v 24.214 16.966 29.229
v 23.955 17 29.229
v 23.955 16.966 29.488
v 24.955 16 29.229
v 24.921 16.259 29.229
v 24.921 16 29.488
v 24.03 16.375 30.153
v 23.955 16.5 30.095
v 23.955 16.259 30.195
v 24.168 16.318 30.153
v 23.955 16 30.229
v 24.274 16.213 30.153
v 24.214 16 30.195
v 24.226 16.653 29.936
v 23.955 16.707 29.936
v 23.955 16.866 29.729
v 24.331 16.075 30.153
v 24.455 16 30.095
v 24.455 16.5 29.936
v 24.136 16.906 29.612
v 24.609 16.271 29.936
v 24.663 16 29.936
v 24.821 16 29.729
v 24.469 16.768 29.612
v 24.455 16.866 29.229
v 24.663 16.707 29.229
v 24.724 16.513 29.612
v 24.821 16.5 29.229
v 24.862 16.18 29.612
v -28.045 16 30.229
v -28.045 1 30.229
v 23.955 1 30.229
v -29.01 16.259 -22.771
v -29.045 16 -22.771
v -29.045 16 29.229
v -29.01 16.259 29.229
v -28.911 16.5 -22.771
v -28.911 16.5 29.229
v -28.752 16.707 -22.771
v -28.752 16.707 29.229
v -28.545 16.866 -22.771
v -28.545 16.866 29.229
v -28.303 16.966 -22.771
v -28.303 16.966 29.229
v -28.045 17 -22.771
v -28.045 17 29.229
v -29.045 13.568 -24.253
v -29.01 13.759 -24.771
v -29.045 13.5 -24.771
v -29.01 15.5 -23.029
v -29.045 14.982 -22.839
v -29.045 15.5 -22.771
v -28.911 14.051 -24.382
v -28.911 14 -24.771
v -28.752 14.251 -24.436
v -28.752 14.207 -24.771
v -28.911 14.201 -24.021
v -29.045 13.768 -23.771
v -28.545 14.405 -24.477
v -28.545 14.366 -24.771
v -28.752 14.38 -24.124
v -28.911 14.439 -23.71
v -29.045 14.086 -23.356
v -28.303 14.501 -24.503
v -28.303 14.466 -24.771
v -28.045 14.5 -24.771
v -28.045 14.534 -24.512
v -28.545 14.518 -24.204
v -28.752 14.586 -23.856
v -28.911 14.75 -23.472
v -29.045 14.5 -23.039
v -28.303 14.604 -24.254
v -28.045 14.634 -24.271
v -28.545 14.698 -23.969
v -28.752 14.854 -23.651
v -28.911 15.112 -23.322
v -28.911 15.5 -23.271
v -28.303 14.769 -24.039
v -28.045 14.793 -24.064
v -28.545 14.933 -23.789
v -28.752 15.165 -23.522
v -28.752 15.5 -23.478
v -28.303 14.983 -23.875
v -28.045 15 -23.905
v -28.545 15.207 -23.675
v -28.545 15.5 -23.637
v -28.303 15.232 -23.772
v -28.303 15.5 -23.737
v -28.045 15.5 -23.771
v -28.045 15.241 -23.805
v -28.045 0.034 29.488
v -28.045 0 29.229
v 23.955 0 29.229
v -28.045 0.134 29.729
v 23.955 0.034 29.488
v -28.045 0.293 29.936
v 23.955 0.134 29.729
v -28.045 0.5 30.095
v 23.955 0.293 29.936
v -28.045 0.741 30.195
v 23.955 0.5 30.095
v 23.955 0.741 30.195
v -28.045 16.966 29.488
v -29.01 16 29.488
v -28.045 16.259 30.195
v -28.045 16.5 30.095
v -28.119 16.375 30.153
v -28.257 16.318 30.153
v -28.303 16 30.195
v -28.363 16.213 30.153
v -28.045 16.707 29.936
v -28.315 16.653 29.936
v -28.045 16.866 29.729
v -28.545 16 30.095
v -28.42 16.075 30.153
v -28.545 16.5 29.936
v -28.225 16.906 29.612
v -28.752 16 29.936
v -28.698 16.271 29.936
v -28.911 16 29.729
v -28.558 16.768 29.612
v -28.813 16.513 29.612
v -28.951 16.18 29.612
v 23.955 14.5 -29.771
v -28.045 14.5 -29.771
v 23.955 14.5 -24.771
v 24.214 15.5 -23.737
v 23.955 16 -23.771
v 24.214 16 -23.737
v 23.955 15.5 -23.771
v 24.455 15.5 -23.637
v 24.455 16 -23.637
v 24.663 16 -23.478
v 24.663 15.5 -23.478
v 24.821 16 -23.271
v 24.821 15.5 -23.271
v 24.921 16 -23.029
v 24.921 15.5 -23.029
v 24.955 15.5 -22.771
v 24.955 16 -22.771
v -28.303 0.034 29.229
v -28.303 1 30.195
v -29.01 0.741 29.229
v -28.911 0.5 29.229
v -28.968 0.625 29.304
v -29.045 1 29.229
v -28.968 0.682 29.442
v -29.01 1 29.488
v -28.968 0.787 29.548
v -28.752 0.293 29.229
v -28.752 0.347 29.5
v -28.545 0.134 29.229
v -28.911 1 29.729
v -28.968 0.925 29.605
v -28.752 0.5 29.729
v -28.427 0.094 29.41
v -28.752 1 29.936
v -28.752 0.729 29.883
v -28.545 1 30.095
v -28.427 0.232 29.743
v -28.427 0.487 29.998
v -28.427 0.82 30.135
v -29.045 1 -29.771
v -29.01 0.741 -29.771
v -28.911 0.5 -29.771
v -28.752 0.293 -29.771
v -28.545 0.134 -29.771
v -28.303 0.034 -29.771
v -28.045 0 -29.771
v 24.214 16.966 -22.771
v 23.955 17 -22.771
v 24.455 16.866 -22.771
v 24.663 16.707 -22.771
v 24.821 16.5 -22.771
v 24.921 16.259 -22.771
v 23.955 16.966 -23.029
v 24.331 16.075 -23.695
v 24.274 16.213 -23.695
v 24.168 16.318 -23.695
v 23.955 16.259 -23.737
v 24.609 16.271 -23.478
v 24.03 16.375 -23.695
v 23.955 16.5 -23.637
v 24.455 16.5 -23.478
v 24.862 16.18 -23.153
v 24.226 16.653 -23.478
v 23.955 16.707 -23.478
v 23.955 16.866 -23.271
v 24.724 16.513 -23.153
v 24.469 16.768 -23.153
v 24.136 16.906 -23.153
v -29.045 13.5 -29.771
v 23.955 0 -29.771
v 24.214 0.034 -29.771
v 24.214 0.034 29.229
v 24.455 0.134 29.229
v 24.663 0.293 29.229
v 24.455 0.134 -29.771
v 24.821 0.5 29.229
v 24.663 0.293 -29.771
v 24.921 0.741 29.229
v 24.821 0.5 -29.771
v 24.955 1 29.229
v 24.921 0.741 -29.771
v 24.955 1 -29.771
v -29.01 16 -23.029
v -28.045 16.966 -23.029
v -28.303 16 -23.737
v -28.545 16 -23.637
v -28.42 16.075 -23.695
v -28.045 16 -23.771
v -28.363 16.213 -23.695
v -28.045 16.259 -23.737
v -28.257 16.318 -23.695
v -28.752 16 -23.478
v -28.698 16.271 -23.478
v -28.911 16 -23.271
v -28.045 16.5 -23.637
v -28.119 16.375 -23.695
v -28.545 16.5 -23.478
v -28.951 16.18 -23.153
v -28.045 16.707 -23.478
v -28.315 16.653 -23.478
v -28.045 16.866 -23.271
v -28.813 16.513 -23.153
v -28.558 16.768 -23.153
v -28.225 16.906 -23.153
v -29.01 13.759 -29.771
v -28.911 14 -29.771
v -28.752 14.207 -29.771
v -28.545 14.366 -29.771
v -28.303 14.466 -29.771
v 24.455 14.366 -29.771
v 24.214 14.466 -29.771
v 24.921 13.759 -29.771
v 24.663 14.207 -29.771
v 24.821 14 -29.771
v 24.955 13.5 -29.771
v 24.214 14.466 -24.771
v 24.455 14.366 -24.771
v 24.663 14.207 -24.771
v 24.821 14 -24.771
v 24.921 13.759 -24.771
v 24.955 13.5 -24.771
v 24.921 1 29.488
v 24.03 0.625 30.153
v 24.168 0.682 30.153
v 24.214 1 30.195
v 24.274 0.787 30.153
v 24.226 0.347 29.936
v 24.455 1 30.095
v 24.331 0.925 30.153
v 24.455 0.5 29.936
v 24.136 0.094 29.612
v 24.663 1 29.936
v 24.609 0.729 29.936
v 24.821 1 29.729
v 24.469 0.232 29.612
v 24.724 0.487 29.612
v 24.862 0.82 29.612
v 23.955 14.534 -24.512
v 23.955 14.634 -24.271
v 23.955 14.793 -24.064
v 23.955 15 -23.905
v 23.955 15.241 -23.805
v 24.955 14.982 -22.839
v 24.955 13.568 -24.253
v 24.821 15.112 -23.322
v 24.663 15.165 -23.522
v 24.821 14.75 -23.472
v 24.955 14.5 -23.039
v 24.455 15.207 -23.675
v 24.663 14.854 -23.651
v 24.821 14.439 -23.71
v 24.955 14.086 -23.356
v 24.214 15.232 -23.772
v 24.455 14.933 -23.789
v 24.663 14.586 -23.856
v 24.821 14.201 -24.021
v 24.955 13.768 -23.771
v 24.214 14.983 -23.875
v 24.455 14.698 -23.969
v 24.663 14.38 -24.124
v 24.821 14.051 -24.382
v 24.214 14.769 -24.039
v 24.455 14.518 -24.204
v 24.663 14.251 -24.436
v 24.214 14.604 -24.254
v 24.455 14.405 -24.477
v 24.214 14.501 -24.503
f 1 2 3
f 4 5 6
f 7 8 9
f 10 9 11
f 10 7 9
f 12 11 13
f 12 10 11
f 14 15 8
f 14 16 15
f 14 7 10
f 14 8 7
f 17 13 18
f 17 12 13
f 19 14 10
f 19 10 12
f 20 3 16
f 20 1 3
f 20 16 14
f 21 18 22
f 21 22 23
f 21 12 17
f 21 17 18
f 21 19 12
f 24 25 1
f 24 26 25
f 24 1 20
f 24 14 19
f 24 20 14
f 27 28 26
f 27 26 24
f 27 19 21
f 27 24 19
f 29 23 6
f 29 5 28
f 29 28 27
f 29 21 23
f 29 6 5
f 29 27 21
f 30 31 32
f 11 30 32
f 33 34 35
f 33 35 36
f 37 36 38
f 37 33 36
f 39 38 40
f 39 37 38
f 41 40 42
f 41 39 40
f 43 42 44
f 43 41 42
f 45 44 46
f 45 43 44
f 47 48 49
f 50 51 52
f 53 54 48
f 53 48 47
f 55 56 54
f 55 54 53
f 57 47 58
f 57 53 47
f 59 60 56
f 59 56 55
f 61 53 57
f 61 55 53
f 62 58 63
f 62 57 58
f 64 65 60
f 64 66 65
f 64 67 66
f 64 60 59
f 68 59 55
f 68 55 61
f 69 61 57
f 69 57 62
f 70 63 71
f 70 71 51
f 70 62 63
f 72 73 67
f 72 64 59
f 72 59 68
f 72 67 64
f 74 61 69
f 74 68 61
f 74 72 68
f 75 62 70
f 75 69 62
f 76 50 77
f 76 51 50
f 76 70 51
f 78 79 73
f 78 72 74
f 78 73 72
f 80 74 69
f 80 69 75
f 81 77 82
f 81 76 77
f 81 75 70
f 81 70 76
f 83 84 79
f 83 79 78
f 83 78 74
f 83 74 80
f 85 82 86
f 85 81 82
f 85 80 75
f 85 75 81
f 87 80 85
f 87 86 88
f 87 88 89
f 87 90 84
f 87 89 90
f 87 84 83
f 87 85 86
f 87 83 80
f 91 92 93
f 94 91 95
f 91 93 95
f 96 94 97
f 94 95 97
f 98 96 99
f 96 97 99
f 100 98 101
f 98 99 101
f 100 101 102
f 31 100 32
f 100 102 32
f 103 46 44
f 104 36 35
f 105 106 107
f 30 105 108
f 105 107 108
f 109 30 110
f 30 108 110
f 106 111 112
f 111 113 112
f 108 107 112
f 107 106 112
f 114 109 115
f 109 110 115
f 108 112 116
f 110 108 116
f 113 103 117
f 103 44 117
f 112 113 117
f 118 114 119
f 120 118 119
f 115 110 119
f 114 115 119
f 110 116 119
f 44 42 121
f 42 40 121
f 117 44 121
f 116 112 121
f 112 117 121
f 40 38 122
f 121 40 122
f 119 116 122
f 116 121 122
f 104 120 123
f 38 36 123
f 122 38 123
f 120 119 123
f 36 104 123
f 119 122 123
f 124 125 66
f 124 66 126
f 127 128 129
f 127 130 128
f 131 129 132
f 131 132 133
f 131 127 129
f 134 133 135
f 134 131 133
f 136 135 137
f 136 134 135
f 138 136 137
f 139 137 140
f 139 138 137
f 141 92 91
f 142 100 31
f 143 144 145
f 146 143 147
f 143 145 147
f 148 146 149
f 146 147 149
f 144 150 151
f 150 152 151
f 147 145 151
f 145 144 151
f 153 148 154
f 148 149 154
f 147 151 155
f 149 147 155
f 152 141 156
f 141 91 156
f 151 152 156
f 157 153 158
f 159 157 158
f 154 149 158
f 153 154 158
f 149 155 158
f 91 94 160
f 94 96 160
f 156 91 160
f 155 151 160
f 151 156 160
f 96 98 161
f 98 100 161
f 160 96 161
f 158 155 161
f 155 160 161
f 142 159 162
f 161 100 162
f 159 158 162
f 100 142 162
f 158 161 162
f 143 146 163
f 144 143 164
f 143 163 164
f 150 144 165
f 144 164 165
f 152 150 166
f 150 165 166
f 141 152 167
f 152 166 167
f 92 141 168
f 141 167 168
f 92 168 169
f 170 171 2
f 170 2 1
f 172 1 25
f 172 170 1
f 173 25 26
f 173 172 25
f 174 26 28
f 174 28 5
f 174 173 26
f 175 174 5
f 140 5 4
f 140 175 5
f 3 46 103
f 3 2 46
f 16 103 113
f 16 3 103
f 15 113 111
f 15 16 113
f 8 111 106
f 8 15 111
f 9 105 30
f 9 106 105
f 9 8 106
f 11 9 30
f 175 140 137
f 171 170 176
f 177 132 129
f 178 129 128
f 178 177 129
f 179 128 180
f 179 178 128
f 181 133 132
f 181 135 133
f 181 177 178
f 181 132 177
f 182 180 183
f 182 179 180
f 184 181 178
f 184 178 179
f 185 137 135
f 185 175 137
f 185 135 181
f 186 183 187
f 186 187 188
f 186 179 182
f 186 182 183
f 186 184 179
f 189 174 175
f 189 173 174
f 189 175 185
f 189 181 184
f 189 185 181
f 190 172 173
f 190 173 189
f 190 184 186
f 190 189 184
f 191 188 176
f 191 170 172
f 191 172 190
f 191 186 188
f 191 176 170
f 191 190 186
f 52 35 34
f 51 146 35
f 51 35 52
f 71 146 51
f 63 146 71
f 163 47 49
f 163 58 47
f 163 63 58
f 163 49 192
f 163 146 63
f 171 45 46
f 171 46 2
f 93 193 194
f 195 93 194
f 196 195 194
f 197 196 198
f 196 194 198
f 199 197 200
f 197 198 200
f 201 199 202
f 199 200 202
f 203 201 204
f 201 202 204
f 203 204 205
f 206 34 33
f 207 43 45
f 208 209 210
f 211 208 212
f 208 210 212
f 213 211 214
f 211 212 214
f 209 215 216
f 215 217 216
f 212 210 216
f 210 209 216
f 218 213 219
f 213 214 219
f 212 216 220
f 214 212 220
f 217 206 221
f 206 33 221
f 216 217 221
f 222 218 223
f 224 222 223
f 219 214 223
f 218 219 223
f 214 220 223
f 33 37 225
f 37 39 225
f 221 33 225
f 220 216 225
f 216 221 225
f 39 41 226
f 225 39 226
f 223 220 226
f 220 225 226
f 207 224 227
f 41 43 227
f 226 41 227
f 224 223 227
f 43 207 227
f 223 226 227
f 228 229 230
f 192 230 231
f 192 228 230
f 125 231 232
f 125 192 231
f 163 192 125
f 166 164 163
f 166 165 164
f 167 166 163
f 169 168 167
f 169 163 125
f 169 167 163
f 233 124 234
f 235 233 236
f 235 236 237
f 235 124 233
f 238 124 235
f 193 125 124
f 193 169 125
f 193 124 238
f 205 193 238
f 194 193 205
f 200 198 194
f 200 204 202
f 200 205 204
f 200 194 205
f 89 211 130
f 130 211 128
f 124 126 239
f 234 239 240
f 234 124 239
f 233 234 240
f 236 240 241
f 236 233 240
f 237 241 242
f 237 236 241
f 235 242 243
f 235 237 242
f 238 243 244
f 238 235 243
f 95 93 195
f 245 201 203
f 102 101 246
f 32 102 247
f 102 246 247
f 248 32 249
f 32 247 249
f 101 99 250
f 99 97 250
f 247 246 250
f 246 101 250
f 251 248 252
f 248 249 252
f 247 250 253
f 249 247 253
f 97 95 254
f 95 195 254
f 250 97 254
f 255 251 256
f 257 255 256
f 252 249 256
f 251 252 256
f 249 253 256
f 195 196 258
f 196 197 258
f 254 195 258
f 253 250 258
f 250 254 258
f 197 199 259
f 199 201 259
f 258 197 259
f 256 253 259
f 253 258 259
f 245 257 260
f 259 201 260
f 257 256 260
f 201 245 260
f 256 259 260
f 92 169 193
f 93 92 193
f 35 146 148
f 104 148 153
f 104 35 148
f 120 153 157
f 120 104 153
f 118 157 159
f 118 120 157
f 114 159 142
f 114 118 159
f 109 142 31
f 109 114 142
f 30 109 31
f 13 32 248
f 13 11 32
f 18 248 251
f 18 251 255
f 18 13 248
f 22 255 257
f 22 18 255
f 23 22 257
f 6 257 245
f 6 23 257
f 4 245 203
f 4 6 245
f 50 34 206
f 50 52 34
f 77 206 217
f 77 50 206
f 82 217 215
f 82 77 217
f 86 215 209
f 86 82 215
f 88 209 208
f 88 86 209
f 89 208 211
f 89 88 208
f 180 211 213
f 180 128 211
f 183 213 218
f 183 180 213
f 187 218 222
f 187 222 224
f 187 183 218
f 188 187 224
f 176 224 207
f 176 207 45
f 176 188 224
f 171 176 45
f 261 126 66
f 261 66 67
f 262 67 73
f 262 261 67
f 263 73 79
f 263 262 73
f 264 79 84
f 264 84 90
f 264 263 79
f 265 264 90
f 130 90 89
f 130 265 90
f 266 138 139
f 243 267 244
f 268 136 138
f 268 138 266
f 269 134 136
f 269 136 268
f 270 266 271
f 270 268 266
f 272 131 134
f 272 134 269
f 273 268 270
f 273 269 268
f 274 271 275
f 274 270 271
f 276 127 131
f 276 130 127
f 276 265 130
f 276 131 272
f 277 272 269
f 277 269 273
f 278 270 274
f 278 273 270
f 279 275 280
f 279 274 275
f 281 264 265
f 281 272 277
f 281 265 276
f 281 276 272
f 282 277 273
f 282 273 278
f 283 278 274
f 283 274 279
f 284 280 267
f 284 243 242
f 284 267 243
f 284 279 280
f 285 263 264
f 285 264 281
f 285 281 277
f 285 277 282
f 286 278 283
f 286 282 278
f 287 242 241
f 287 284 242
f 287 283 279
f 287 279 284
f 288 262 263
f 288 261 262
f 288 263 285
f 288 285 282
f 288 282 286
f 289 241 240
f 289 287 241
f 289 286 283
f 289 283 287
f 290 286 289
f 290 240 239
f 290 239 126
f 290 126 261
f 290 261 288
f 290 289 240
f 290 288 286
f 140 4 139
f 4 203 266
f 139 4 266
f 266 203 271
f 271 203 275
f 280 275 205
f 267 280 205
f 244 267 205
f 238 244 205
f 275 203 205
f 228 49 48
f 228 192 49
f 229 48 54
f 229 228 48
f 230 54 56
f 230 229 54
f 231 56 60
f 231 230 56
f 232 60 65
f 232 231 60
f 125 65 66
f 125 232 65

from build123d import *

# Parameters (mm, degrees)
SKETCH1_W           = 54
SKETCH1_H           = 60
BOSS_EXTRUDE1_DEPTH = 17
SKETCH2_W           = 54
SKETCH2_H           = 6
CUT_EXTRUDE1_DEPTH  = 2.5
FILLET1_R           = 1


with BuildPart() as part:
    # Sketch1 → Boss-Extrude1 (new body)
    with BuildSketch(Plane(origin=(0, 0, 0), x_dir=(1, 0, 0), z_dir=(0, 1, 0))):
        with Locations((-2.044526592, -0.229360244)):
            Rectangle(SKETCH1_W, SKETCH1_H)
    extrude(amount=BOSS_EXTRUDE1_DEPTH)

    # Sketch2 → Cut-Extrude1 (cut)
    with BuildSketch(Plane(origin=(0, 17, 0), x_dir=(1, 0, 0), z_dir=(0, 1, 0))):
        with Locations((-2.044526592, 26.770639756)):
            Rectangle(SKETCH2_W, SKETCH2_H)
    extrude(amount=-CUT_EXTRUDE1_DEPTH, mode=Mode.SUBTRACT)

    # Fillet1
    fillet1_edges = [part.edges().sort_by_distance(p)[0] for p in [
        (24.955473408, 17, 3.229360244),
        (-29.044526592, 17, 3.229360244),
        (-29.044526592, 14.5, -26.770639756),
        (-29.044526592, 15.75, -23.770639756),
        (24.955473408, 14.5, -26.770639756),
        (-2.044526592, 14.5, -23.770639756),
        (24.955473408, 15.75, -23.770639756),
        (-2.044526592, 17, -23.770639756),
        (24.955473408, 0, 0.229360244),
        (-2.044526592, 0, 30.229360244),
        (-29.044526592, 0, 0.229360244),
        (-2.044526592, 17, 30.229360244),
        (24.955473408, 8.5, 30.229360244),
        (-29.044526592, 8.5, 30.229360244),
    ]]
    fillet(fillet1_edges, radius=FILLET1_R)


solid = part.part
